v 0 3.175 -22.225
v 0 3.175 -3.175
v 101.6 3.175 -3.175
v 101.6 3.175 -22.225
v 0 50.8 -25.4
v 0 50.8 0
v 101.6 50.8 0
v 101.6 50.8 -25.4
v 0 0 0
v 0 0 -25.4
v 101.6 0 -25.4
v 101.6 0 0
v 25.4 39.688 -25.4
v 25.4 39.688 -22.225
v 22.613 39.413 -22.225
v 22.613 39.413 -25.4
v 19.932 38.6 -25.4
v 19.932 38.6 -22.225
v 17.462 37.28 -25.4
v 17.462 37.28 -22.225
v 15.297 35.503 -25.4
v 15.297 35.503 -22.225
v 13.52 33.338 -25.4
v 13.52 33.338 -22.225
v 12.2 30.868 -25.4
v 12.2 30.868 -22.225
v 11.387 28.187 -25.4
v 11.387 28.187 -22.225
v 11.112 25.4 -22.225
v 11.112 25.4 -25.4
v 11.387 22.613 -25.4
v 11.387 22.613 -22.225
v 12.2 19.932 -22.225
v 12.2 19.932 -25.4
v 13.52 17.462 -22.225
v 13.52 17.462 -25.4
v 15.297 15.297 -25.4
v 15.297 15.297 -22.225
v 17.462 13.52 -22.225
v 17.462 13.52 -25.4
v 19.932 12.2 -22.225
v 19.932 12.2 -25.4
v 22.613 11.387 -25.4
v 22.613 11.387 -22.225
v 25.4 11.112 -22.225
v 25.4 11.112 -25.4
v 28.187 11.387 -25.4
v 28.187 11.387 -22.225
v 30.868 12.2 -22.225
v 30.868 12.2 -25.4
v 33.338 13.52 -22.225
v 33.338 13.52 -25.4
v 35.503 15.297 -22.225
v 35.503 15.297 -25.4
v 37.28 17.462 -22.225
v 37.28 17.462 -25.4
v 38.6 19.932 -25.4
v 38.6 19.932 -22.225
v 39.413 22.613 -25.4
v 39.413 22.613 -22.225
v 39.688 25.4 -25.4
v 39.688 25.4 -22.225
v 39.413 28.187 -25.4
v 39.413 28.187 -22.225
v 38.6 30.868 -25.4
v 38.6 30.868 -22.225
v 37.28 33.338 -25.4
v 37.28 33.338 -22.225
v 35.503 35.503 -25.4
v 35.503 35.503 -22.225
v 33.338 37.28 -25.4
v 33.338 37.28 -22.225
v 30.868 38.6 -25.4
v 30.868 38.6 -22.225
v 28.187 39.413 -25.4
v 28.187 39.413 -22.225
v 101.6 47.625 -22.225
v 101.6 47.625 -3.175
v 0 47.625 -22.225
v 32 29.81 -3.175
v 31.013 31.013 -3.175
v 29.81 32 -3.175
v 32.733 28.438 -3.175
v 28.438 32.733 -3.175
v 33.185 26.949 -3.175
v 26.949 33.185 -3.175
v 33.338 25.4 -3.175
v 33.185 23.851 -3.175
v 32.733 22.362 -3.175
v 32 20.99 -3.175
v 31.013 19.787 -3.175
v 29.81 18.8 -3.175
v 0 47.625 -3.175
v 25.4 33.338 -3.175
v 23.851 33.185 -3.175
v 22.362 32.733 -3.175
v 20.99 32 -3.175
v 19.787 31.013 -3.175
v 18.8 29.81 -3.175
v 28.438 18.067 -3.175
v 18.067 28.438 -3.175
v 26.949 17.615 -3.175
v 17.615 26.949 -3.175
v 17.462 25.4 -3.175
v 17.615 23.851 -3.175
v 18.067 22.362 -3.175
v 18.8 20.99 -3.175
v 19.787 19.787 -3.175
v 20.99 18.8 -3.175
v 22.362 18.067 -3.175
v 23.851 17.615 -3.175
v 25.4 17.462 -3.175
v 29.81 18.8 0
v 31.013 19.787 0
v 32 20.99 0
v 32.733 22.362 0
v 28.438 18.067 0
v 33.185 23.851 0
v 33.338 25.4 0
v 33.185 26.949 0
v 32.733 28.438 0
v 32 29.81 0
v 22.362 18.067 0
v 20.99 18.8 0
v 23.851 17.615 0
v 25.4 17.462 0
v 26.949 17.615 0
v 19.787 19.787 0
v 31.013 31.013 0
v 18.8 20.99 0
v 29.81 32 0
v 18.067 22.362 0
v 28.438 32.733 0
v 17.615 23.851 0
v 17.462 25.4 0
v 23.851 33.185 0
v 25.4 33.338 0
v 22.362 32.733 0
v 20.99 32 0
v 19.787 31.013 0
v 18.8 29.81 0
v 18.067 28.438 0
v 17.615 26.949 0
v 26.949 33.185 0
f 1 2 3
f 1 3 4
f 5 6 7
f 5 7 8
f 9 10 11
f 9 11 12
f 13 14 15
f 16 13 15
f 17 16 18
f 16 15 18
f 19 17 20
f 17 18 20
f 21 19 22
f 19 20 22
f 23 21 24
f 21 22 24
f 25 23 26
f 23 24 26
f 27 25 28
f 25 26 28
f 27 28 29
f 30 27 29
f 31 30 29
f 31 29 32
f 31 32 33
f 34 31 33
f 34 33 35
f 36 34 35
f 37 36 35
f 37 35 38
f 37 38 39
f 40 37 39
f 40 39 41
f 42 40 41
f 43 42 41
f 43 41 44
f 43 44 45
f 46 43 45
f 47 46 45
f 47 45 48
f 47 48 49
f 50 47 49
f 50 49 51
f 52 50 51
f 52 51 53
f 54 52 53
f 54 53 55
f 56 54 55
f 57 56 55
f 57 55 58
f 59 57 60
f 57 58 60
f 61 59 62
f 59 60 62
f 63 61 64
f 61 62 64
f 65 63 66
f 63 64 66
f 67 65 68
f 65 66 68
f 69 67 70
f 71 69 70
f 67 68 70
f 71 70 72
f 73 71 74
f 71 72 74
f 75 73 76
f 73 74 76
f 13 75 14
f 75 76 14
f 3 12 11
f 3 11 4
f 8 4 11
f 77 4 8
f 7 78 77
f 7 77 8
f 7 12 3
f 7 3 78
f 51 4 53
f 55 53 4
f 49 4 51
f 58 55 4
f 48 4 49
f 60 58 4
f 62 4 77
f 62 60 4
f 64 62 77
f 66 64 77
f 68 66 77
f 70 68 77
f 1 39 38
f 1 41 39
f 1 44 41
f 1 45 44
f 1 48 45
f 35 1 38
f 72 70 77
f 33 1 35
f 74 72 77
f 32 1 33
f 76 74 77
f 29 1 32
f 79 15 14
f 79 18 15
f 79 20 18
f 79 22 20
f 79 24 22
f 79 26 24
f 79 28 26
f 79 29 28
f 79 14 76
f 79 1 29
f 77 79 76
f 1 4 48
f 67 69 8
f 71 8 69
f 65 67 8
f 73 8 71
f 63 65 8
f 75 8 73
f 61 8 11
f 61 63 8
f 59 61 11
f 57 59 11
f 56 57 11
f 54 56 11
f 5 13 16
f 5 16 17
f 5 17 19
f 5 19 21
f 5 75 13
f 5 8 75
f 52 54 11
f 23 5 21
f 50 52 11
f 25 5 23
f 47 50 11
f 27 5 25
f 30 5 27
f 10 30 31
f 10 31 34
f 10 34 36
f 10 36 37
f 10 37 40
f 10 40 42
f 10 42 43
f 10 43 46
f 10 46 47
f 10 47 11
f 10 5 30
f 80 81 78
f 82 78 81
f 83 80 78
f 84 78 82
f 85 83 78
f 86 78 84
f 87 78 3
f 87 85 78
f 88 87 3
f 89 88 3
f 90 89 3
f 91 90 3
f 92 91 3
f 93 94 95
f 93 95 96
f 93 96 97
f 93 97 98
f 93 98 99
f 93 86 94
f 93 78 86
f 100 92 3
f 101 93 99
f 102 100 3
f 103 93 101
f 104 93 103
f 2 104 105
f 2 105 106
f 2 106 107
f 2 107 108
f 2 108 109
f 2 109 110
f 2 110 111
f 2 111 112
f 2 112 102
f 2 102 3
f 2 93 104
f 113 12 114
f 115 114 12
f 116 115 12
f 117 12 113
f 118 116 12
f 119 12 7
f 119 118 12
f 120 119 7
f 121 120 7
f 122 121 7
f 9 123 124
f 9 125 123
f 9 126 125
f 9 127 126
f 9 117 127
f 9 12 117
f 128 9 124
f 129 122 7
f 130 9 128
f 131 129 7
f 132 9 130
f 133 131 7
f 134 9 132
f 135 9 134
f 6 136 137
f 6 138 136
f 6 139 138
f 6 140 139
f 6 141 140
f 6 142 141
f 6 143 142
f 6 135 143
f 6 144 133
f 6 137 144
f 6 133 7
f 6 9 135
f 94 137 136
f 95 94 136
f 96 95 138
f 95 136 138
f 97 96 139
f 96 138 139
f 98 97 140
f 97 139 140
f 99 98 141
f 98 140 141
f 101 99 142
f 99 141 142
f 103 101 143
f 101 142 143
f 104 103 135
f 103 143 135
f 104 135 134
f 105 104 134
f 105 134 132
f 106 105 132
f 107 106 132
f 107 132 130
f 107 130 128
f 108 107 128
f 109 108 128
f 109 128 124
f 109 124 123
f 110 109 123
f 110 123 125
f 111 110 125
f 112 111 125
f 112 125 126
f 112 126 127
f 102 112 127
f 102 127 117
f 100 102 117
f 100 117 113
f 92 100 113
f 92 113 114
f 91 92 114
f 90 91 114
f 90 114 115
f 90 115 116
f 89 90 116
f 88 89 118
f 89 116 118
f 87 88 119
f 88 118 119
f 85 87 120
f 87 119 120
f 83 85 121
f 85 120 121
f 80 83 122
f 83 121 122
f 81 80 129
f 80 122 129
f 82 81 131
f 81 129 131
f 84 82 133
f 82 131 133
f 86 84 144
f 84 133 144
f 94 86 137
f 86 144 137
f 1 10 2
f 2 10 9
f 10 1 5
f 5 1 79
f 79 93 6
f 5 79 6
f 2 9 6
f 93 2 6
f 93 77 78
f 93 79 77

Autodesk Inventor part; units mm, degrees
ref_plane "YZ Plane" through (0, 0, 0) normal (1, 0, 0) x (0, 1, 0)
ref_plane "XZ Plane" through (0, 0, 0) normal (0, 1, 0) x (-1, 0, 0)
ref_plane "XY Plane" through (0, 0, 0) normal (0, 0, 1) x (1, 0, 0)
sketch "Sketch1" plane through (0, 0, 0) normal (1, 0, 0) x (0, 1, 0)
  line L0 (0, 0) -> (50.8, 0)
  line L1 (50.8, 0) -> (50.8, -25.4)
  line L2 (50.8, -25.4) -> (0, -25.4)
  line L3 (0, -25.4) -> (0, 0)
  line L4 (47.625, -3.175) -> (3.175, -3.175)
  line L5 (3.175, -3.175) -> (3.175, -22.225)
  line L6 (3.175, -22.225) -> (47.625, -22.225)
  line L7 (47.625, -22.225) -> (47.625, -3.175)
  dimension "d0" = 50.8
  dimension "d1" = 25.4
  dimension "d2" = 3.175
extrude "Extrusion1" add sketch "Sketch1" along normal blind 101.6
sketch "Sketch2" plane through (0, 0, -25.4) normal (0, 0, -1) x (-1, 0, 0)
  line L0 (0, 50.8) -> (-101.6, 50.8) projected
  line L1 (0, 50.8) -> (0, 0) projected
  line L2 (0, 0) -> (-101.6, 0) projected
  point P0 (-25.4, 25.4)
  dimension "d5" = 25.4
  dimension "d6" = 25.4
hole "Hole1" at (25.4, 25.4, -25.4) direction (0, 0, 1) diameter 28.575 depth 3.175 tip angle 118
hole "Hole2" at (25.4, 25.4, -25.4) direction (0, 0, 1) diameter 15.875 end through all
properties part number "15102898-16-P-0304" material "Aluminum 6061"
